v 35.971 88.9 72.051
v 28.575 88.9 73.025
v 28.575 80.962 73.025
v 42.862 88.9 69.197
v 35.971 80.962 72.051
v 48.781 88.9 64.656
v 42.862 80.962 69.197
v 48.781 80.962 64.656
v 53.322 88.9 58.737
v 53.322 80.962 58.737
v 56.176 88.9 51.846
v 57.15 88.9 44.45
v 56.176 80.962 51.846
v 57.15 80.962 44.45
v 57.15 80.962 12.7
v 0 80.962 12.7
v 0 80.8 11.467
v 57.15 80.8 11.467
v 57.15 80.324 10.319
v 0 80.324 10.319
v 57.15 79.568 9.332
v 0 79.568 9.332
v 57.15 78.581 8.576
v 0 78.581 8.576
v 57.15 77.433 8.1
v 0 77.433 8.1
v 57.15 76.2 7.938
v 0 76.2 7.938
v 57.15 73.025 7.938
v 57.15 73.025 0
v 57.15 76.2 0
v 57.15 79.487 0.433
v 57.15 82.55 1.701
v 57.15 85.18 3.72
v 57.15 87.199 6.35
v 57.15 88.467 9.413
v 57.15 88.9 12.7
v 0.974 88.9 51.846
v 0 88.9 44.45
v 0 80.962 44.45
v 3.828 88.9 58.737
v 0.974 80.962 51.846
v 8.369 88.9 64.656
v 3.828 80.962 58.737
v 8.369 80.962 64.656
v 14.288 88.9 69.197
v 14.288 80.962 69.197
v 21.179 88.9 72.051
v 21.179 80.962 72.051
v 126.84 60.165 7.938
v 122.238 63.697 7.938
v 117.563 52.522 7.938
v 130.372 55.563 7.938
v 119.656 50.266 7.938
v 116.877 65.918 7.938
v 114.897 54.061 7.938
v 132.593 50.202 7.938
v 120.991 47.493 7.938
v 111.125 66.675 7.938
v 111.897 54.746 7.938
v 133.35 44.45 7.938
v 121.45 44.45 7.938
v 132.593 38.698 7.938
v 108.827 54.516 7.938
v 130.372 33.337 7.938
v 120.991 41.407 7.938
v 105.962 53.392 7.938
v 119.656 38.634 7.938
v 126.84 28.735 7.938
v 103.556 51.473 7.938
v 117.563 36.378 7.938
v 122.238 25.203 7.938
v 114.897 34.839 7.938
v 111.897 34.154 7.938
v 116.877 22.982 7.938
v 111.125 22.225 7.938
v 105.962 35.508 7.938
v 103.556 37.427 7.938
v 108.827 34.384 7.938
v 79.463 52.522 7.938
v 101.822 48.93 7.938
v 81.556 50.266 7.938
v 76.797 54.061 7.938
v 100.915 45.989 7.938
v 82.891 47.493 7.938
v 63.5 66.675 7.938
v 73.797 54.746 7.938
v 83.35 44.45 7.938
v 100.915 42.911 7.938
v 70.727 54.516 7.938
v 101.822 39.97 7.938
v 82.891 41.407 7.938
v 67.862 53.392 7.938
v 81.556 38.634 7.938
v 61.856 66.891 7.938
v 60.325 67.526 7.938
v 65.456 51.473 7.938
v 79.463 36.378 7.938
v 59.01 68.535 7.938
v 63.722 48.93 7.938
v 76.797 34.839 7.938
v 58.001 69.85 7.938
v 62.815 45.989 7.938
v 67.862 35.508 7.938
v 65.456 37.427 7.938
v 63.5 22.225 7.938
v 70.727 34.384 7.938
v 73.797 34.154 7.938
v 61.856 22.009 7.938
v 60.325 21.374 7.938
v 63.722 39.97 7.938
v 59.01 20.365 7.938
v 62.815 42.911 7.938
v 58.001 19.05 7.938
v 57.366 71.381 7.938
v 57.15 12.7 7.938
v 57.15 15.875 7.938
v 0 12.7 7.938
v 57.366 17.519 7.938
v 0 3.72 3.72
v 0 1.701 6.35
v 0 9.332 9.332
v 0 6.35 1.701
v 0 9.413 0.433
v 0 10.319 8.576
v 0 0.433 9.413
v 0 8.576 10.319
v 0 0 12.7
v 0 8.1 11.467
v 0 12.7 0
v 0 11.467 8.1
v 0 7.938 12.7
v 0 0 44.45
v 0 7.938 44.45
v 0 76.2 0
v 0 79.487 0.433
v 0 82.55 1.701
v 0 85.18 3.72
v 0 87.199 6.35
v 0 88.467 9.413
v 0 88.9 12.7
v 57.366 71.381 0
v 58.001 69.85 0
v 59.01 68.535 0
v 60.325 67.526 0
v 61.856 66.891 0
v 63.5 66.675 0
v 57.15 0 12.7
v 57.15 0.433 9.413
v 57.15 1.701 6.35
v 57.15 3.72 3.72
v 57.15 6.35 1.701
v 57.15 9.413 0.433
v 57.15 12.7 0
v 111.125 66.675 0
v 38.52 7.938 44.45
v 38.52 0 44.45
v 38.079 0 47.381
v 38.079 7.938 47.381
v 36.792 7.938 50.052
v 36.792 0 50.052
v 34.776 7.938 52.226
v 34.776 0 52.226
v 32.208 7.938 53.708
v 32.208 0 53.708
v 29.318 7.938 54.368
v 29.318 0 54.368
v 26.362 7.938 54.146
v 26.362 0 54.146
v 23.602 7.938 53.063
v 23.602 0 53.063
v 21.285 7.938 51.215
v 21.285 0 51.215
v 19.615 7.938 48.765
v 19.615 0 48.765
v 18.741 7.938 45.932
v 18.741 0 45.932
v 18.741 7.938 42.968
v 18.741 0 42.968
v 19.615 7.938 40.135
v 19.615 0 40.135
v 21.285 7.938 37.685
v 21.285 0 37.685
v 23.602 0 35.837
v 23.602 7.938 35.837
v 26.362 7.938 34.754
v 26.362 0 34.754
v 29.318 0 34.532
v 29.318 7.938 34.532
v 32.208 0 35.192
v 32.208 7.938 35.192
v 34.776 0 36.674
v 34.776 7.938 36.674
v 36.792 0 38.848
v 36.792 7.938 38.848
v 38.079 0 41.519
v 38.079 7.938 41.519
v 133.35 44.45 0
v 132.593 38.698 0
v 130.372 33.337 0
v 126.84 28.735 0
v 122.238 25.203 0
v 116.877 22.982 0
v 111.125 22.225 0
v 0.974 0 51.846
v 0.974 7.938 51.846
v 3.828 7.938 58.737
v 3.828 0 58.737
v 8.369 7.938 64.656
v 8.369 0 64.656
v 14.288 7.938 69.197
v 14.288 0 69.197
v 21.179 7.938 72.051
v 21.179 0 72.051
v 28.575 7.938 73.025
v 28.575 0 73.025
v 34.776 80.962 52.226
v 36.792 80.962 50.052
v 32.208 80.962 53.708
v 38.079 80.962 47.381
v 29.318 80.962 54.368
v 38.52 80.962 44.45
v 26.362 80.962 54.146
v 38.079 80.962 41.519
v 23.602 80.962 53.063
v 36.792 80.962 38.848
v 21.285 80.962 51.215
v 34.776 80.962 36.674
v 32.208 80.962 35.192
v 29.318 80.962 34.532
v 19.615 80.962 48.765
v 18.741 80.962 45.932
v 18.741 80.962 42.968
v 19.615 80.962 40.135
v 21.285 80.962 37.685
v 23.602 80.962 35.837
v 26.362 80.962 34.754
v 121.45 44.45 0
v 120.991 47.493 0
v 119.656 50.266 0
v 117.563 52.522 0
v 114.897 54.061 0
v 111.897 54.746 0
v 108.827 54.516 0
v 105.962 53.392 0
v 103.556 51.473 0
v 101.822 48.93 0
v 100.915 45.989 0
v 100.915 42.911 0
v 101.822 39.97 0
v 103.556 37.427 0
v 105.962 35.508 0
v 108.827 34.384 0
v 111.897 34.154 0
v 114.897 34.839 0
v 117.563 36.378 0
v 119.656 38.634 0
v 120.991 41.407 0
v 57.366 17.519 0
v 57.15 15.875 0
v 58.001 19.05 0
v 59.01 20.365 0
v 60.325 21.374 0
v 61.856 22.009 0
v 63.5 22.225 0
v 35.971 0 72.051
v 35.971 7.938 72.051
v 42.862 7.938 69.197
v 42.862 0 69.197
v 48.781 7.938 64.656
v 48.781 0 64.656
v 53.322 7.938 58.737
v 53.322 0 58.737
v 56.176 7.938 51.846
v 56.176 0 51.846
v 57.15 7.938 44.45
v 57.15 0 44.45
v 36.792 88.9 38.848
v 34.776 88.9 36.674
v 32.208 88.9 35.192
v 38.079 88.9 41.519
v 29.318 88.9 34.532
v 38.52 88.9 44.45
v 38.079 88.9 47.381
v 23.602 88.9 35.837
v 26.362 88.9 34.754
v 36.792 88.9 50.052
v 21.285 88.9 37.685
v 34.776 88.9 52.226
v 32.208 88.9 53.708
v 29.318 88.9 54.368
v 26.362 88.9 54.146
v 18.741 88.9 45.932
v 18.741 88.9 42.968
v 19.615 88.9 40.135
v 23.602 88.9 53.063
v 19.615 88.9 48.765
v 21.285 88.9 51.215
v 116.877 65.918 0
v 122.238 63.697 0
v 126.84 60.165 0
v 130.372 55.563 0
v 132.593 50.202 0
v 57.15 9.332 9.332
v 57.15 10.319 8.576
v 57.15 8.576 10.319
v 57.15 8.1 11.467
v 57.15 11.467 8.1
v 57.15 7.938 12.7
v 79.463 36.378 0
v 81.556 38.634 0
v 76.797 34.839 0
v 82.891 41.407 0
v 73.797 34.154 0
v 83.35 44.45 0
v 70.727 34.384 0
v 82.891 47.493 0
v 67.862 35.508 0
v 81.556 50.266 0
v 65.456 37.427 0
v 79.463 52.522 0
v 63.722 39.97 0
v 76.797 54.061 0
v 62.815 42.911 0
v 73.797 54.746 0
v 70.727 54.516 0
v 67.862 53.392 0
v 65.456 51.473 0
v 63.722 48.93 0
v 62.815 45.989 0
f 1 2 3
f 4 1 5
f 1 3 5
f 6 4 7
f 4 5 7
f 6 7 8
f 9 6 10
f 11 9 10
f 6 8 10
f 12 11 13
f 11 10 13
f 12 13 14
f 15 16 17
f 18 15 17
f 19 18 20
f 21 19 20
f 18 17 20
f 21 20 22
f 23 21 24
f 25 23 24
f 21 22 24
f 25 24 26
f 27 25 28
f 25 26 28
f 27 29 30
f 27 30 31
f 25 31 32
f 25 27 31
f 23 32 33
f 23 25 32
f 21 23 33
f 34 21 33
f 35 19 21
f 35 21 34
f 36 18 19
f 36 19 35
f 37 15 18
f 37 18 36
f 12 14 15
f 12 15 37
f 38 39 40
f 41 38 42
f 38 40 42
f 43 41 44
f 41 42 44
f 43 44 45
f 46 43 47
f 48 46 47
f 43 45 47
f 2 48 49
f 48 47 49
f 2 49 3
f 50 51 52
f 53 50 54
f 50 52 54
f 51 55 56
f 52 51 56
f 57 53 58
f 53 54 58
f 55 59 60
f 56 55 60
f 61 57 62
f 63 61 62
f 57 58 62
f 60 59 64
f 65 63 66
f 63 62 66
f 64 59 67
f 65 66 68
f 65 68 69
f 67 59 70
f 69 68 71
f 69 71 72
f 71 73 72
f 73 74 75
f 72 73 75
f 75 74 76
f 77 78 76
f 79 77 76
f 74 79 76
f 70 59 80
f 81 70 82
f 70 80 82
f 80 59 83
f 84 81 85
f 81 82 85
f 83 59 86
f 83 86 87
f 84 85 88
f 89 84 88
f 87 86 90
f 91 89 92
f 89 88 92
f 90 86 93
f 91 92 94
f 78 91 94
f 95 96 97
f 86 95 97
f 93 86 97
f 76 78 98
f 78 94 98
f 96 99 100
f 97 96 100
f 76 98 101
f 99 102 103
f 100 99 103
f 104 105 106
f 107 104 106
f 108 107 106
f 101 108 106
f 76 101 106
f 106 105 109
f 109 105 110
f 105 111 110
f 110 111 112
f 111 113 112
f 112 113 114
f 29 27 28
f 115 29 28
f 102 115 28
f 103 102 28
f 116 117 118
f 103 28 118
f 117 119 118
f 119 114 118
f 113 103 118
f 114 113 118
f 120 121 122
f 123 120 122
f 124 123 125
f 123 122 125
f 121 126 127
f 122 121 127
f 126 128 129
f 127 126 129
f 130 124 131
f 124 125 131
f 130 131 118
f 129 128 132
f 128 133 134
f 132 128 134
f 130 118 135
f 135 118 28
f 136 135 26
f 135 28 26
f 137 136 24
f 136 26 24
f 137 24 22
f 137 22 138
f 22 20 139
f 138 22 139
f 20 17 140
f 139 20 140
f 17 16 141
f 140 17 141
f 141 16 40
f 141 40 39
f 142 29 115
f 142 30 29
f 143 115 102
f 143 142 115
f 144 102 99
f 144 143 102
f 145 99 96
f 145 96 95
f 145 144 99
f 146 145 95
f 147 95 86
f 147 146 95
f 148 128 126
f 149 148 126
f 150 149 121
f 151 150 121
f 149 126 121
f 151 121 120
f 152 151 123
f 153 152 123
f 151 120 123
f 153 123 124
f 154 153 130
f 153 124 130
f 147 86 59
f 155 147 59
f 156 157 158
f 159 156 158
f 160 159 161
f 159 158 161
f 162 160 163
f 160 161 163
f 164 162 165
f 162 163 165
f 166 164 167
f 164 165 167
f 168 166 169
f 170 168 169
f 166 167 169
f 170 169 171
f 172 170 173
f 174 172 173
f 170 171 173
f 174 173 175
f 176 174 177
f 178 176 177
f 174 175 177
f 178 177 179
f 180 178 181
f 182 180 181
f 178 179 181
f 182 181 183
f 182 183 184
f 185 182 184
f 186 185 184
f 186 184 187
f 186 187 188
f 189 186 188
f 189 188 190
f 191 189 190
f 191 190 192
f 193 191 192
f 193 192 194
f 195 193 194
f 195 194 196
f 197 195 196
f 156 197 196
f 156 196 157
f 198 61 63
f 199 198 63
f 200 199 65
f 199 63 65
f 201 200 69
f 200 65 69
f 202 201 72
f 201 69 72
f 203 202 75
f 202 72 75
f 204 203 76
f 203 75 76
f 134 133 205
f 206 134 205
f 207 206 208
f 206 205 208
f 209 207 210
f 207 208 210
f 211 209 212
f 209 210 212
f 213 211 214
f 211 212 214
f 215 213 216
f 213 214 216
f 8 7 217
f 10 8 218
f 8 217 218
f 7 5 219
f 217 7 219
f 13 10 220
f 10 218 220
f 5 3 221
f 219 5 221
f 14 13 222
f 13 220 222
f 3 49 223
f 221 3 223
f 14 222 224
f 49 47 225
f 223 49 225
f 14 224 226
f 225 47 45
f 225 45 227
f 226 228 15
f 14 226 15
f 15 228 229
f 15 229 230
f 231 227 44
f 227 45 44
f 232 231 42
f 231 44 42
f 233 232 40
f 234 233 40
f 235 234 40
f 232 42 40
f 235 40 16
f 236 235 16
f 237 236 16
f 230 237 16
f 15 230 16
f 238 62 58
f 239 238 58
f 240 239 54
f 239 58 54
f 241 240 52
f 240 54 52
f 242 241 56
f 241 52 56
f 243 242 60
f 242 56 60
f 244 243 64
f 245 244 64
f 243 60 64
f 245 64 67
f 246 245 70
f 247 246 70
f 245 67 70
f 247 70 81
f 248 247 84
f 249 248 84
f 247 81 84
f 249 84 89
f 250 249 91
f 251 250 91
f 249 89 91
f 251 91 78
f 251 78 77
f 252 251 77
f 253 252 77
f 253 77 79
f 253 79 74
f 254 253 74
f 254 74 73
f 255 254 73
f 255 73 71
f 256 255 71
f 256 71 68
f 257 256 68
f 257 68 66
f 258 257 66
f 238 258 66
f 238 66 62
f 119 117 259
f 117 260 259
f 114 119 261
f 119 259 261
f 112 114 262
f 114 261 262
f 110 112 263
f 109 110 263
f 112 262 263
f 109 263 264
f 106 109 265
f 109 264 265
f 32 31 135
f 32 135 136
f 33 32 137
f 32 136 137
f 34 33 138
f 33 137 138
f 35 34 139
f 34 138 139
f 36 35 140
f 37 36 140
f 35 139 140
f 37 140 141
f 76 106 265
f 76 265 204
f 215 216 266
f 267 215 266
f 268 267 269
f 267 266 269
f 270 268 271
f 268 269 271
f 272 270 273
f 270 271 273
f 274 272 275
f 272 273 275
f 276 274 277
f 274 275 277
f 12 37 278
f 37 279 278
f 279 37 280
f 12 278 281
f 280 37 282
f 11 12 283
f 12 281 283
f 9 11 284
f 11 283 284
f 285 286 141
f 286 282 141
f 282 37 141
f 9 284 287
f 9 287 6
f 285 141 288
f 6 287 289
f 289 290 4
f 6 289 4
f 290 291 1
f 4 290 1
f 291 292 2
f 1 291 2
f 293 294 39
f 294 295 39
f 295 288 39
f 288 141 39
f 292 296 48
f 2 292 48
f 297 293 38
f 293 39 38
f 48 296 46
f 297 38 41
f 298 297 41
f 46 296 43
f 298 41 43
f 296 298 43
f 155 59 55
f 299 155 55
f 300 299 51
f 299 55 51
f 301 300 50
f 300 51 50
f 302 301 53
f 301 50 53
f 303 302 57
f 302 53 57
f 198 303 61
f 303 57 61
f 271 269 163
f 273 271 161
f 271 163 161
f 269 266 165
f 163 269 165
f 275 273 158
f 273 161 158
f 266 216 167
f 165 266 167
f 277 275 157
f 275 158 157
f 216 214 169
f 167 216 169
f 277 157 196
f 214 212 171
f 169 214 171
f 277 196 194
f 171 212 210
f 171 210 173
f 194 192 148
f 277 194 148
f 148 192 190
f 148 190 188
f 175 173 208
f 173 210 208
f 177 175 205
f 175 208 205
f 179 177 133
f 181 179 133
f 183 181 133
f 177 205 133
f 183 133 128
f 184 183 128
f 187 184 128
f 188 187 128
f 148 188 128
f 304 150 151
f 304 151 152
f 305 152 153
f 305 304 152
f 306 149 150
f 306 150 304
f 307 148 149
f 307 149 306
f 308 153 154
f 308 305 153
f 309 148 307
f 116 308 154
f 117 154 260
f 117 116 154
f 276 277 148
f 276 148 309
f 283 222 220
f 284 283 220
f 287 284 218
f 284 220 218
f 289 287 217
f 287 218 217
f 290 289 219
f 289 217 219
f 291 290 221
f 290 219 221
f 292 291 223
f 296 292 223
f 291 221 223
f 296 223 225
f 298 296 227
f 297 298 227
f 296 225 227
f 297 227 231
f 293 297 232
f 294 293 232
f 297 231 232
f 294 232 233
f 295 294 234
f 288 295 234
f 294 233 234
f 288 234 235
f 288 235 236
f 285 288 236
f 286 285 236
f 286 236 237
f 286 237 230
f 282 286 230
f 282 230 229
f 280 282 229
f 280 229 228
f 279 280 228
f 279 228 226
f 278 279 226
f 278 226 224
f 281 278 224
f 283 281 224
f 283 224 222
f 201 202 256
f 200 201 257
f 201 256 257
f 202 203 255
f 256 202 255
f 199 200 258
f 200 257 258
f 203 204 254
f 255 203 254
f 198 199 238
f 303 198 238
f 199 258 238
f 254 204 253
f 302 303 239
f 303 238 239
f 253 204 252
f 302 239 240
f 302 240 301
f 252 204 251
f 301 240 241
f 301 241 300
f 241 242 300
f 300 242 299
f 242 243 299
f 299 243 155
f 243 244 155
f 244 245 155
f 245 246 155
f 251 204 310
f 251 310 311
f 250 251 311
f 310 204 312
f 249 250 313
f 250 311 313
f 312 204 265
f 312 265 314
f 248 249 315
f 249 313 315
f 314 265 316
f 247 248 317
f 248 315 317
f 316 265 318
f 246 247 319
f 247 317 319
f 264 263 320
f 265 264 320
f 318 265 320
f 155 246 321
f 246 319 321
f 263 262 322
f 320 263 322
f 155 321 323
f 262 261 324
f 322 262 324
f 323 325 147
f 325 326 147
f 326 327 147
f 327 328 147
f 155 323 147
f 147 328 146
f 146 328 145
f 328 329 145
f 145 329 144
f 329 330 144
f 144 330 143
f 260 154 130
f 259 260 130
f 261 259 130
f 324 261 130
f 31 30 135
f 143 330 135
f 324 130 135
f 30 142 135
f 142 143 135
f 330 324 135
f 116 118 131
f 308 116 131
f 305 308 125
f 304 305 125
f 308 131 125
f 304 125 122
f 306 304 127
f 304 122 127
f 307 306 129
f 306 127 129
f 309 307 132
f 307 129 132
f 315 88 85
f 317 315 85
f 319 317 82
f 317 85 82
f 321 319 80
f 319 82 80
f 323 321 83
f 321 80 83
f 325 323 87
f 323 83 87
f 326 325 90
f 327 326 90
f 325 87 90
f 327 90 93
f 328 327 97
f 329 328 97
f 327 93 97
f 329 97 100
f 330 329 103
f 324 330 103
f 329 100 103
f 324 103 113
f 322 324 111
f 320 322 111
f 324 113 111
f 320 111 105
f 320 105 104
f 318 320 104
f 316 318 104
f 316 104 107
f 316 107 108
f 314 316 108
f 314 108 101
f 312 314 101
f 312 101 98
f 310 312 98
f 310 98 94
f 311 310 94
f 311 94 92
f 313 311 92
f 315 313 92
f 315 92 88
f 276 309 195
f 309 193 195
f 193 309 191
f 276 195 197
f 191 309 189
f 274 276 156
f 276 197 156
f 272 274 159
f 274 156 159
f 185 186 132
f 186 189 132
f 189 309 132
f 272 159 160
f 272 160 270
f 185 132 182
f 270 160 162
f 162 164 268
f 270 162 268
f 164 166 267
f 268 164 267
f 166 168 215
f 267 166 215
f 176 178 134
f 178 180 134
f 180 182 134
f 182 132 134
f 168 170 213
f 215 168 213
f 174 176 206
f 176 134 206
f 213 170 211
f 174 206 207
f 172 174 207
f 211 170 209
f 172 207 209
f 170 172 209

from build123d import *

# Parameters (mm, degrees)
F1_DEPTH = 57.15
F2_R     = 9.94537
F3_DEPTH = 88.9
F5_DEPTH = 88.9
F6_W     = 76.2
F6_H     = 44.45
F7_DEPTH = 7.9375
F8_R     = 10.3251
F9_DEPTH = 25.4
F10_R    = 6.35


with BuildPart() as f1:
    # F0 (on Right) → F1 (new body)
    with BuildSketch(Plane.YZ):
        with BuildLine():
            ThreePointArc((0, 12.7), (3.7197438789, 3.7197438789), (12.7, 0))
            Line((12.7, 0), (76.2, 0))
            ThreePointArc((76.2, 0), (85.1802561211, 3.7197438789), (88.9, 12.7))
            Line((88.9, 12.7), (88.9, 73.025))
            Line((88.9, 73.025), (80.9625, 73.025))
            Line((80.9625, 73.025), (80.9625, 12.7))
            ThreePointArc((80.9625, 12.7), (79.5675960454, 9.3324039546), (76.2, 7.9375))
            Line((76.2, 7.9375), (12.7, 7.9375))
            ThreePointArc((12.7, 7.9375), (9.3324039546, 9.3324039546), (7.9375, 12.7))
            Line((7.9375, 12.7), (7.9375, 73.025))
            Line((7.9375, 73.025), (0, 73.025))
            Line((0, 73.025), (0, 12.7))
        make_face()
    extrude(amount=F1_DEPTH)

    # F2 (on face) → F3 (cut)
    with BuildSketch(Plane.XZ):
        with Locations((28.575, 44.45)):
            Circle(F2_R)
    extrude(amount=-F3_DEPTH, mode=Mode.SUBTRACT)

    # F4 (on face) → F5 (cut)
    with BuildSketch(Plane.XZ):
        with BuildLine():
            ThreePointArc((0, 44.45), (8.3694237276, 64.6555762724), (28.575, 73.025))
            Line((28.575, 73.025), (0, 73.025))
            Line((0, 73.025), (0, 44.45))
        make_face()
        with BuildLine():
            ThreePointArc((28.575, 73.025), (48.7805762724, 64.6555762724), (57.15, 44.45))
            Line((57.15, 44.45), (57.15, 73.025))
            Line((57.15, 73.025), (28.575, 73.025))
        make_face()
    extrude(amount=-F5_DEPTH, mode=Mode.SUBTRACT)

    # F6 (on face) → F7 (join)
    with BuildSketch(Plane.XY.offset(7.9375)):
        with Locations((95.25, 44.45)):
            Rectangle(F6_W, F6_H)
    extrude(amount=-F7_DEPTH)

    # F8 (on face) → F9 (cut)
    with BuildSketch(Plane.XY.offset(7.9375)):
        with Locations((73.025, 44.45)):
            Circle(F8_R)
        with Locations((111.125, 44.45)):
            Circle(F8_R)
        with BuildLine():
            ThreePointArc((111.125, 66.675), (126.8404482119, 60.1654482119), (133.35, 44.45))
            Line((133.35, 44.45), (133.35, 66.675))
            Line((133.35, 66.675), (111.125, 66.675))
        make_face()
        with BuildLine():
            Line((133.35, 22.225), (133.35, 44.45))
            ThreePointArc((133.35, 44.45), (126.8404482119, 28.7345517881), (111.125, 22.225))
            Line((111.125, 22.225), (133.35, 22.225))
        make_face()
    extrude(amount=-F9_DEPTH, mode=Mode.SUBTRACT)

    # F10
    f10_edges = [f1.edges().sort_by_distance(p)[0] for p in [
        (57.15, 22.225, 3.96875),
        (57.15, 66.675, 3.96875),
    ]]
    fillet(f10_edges, radius=F10_R)


solid = f1.part
